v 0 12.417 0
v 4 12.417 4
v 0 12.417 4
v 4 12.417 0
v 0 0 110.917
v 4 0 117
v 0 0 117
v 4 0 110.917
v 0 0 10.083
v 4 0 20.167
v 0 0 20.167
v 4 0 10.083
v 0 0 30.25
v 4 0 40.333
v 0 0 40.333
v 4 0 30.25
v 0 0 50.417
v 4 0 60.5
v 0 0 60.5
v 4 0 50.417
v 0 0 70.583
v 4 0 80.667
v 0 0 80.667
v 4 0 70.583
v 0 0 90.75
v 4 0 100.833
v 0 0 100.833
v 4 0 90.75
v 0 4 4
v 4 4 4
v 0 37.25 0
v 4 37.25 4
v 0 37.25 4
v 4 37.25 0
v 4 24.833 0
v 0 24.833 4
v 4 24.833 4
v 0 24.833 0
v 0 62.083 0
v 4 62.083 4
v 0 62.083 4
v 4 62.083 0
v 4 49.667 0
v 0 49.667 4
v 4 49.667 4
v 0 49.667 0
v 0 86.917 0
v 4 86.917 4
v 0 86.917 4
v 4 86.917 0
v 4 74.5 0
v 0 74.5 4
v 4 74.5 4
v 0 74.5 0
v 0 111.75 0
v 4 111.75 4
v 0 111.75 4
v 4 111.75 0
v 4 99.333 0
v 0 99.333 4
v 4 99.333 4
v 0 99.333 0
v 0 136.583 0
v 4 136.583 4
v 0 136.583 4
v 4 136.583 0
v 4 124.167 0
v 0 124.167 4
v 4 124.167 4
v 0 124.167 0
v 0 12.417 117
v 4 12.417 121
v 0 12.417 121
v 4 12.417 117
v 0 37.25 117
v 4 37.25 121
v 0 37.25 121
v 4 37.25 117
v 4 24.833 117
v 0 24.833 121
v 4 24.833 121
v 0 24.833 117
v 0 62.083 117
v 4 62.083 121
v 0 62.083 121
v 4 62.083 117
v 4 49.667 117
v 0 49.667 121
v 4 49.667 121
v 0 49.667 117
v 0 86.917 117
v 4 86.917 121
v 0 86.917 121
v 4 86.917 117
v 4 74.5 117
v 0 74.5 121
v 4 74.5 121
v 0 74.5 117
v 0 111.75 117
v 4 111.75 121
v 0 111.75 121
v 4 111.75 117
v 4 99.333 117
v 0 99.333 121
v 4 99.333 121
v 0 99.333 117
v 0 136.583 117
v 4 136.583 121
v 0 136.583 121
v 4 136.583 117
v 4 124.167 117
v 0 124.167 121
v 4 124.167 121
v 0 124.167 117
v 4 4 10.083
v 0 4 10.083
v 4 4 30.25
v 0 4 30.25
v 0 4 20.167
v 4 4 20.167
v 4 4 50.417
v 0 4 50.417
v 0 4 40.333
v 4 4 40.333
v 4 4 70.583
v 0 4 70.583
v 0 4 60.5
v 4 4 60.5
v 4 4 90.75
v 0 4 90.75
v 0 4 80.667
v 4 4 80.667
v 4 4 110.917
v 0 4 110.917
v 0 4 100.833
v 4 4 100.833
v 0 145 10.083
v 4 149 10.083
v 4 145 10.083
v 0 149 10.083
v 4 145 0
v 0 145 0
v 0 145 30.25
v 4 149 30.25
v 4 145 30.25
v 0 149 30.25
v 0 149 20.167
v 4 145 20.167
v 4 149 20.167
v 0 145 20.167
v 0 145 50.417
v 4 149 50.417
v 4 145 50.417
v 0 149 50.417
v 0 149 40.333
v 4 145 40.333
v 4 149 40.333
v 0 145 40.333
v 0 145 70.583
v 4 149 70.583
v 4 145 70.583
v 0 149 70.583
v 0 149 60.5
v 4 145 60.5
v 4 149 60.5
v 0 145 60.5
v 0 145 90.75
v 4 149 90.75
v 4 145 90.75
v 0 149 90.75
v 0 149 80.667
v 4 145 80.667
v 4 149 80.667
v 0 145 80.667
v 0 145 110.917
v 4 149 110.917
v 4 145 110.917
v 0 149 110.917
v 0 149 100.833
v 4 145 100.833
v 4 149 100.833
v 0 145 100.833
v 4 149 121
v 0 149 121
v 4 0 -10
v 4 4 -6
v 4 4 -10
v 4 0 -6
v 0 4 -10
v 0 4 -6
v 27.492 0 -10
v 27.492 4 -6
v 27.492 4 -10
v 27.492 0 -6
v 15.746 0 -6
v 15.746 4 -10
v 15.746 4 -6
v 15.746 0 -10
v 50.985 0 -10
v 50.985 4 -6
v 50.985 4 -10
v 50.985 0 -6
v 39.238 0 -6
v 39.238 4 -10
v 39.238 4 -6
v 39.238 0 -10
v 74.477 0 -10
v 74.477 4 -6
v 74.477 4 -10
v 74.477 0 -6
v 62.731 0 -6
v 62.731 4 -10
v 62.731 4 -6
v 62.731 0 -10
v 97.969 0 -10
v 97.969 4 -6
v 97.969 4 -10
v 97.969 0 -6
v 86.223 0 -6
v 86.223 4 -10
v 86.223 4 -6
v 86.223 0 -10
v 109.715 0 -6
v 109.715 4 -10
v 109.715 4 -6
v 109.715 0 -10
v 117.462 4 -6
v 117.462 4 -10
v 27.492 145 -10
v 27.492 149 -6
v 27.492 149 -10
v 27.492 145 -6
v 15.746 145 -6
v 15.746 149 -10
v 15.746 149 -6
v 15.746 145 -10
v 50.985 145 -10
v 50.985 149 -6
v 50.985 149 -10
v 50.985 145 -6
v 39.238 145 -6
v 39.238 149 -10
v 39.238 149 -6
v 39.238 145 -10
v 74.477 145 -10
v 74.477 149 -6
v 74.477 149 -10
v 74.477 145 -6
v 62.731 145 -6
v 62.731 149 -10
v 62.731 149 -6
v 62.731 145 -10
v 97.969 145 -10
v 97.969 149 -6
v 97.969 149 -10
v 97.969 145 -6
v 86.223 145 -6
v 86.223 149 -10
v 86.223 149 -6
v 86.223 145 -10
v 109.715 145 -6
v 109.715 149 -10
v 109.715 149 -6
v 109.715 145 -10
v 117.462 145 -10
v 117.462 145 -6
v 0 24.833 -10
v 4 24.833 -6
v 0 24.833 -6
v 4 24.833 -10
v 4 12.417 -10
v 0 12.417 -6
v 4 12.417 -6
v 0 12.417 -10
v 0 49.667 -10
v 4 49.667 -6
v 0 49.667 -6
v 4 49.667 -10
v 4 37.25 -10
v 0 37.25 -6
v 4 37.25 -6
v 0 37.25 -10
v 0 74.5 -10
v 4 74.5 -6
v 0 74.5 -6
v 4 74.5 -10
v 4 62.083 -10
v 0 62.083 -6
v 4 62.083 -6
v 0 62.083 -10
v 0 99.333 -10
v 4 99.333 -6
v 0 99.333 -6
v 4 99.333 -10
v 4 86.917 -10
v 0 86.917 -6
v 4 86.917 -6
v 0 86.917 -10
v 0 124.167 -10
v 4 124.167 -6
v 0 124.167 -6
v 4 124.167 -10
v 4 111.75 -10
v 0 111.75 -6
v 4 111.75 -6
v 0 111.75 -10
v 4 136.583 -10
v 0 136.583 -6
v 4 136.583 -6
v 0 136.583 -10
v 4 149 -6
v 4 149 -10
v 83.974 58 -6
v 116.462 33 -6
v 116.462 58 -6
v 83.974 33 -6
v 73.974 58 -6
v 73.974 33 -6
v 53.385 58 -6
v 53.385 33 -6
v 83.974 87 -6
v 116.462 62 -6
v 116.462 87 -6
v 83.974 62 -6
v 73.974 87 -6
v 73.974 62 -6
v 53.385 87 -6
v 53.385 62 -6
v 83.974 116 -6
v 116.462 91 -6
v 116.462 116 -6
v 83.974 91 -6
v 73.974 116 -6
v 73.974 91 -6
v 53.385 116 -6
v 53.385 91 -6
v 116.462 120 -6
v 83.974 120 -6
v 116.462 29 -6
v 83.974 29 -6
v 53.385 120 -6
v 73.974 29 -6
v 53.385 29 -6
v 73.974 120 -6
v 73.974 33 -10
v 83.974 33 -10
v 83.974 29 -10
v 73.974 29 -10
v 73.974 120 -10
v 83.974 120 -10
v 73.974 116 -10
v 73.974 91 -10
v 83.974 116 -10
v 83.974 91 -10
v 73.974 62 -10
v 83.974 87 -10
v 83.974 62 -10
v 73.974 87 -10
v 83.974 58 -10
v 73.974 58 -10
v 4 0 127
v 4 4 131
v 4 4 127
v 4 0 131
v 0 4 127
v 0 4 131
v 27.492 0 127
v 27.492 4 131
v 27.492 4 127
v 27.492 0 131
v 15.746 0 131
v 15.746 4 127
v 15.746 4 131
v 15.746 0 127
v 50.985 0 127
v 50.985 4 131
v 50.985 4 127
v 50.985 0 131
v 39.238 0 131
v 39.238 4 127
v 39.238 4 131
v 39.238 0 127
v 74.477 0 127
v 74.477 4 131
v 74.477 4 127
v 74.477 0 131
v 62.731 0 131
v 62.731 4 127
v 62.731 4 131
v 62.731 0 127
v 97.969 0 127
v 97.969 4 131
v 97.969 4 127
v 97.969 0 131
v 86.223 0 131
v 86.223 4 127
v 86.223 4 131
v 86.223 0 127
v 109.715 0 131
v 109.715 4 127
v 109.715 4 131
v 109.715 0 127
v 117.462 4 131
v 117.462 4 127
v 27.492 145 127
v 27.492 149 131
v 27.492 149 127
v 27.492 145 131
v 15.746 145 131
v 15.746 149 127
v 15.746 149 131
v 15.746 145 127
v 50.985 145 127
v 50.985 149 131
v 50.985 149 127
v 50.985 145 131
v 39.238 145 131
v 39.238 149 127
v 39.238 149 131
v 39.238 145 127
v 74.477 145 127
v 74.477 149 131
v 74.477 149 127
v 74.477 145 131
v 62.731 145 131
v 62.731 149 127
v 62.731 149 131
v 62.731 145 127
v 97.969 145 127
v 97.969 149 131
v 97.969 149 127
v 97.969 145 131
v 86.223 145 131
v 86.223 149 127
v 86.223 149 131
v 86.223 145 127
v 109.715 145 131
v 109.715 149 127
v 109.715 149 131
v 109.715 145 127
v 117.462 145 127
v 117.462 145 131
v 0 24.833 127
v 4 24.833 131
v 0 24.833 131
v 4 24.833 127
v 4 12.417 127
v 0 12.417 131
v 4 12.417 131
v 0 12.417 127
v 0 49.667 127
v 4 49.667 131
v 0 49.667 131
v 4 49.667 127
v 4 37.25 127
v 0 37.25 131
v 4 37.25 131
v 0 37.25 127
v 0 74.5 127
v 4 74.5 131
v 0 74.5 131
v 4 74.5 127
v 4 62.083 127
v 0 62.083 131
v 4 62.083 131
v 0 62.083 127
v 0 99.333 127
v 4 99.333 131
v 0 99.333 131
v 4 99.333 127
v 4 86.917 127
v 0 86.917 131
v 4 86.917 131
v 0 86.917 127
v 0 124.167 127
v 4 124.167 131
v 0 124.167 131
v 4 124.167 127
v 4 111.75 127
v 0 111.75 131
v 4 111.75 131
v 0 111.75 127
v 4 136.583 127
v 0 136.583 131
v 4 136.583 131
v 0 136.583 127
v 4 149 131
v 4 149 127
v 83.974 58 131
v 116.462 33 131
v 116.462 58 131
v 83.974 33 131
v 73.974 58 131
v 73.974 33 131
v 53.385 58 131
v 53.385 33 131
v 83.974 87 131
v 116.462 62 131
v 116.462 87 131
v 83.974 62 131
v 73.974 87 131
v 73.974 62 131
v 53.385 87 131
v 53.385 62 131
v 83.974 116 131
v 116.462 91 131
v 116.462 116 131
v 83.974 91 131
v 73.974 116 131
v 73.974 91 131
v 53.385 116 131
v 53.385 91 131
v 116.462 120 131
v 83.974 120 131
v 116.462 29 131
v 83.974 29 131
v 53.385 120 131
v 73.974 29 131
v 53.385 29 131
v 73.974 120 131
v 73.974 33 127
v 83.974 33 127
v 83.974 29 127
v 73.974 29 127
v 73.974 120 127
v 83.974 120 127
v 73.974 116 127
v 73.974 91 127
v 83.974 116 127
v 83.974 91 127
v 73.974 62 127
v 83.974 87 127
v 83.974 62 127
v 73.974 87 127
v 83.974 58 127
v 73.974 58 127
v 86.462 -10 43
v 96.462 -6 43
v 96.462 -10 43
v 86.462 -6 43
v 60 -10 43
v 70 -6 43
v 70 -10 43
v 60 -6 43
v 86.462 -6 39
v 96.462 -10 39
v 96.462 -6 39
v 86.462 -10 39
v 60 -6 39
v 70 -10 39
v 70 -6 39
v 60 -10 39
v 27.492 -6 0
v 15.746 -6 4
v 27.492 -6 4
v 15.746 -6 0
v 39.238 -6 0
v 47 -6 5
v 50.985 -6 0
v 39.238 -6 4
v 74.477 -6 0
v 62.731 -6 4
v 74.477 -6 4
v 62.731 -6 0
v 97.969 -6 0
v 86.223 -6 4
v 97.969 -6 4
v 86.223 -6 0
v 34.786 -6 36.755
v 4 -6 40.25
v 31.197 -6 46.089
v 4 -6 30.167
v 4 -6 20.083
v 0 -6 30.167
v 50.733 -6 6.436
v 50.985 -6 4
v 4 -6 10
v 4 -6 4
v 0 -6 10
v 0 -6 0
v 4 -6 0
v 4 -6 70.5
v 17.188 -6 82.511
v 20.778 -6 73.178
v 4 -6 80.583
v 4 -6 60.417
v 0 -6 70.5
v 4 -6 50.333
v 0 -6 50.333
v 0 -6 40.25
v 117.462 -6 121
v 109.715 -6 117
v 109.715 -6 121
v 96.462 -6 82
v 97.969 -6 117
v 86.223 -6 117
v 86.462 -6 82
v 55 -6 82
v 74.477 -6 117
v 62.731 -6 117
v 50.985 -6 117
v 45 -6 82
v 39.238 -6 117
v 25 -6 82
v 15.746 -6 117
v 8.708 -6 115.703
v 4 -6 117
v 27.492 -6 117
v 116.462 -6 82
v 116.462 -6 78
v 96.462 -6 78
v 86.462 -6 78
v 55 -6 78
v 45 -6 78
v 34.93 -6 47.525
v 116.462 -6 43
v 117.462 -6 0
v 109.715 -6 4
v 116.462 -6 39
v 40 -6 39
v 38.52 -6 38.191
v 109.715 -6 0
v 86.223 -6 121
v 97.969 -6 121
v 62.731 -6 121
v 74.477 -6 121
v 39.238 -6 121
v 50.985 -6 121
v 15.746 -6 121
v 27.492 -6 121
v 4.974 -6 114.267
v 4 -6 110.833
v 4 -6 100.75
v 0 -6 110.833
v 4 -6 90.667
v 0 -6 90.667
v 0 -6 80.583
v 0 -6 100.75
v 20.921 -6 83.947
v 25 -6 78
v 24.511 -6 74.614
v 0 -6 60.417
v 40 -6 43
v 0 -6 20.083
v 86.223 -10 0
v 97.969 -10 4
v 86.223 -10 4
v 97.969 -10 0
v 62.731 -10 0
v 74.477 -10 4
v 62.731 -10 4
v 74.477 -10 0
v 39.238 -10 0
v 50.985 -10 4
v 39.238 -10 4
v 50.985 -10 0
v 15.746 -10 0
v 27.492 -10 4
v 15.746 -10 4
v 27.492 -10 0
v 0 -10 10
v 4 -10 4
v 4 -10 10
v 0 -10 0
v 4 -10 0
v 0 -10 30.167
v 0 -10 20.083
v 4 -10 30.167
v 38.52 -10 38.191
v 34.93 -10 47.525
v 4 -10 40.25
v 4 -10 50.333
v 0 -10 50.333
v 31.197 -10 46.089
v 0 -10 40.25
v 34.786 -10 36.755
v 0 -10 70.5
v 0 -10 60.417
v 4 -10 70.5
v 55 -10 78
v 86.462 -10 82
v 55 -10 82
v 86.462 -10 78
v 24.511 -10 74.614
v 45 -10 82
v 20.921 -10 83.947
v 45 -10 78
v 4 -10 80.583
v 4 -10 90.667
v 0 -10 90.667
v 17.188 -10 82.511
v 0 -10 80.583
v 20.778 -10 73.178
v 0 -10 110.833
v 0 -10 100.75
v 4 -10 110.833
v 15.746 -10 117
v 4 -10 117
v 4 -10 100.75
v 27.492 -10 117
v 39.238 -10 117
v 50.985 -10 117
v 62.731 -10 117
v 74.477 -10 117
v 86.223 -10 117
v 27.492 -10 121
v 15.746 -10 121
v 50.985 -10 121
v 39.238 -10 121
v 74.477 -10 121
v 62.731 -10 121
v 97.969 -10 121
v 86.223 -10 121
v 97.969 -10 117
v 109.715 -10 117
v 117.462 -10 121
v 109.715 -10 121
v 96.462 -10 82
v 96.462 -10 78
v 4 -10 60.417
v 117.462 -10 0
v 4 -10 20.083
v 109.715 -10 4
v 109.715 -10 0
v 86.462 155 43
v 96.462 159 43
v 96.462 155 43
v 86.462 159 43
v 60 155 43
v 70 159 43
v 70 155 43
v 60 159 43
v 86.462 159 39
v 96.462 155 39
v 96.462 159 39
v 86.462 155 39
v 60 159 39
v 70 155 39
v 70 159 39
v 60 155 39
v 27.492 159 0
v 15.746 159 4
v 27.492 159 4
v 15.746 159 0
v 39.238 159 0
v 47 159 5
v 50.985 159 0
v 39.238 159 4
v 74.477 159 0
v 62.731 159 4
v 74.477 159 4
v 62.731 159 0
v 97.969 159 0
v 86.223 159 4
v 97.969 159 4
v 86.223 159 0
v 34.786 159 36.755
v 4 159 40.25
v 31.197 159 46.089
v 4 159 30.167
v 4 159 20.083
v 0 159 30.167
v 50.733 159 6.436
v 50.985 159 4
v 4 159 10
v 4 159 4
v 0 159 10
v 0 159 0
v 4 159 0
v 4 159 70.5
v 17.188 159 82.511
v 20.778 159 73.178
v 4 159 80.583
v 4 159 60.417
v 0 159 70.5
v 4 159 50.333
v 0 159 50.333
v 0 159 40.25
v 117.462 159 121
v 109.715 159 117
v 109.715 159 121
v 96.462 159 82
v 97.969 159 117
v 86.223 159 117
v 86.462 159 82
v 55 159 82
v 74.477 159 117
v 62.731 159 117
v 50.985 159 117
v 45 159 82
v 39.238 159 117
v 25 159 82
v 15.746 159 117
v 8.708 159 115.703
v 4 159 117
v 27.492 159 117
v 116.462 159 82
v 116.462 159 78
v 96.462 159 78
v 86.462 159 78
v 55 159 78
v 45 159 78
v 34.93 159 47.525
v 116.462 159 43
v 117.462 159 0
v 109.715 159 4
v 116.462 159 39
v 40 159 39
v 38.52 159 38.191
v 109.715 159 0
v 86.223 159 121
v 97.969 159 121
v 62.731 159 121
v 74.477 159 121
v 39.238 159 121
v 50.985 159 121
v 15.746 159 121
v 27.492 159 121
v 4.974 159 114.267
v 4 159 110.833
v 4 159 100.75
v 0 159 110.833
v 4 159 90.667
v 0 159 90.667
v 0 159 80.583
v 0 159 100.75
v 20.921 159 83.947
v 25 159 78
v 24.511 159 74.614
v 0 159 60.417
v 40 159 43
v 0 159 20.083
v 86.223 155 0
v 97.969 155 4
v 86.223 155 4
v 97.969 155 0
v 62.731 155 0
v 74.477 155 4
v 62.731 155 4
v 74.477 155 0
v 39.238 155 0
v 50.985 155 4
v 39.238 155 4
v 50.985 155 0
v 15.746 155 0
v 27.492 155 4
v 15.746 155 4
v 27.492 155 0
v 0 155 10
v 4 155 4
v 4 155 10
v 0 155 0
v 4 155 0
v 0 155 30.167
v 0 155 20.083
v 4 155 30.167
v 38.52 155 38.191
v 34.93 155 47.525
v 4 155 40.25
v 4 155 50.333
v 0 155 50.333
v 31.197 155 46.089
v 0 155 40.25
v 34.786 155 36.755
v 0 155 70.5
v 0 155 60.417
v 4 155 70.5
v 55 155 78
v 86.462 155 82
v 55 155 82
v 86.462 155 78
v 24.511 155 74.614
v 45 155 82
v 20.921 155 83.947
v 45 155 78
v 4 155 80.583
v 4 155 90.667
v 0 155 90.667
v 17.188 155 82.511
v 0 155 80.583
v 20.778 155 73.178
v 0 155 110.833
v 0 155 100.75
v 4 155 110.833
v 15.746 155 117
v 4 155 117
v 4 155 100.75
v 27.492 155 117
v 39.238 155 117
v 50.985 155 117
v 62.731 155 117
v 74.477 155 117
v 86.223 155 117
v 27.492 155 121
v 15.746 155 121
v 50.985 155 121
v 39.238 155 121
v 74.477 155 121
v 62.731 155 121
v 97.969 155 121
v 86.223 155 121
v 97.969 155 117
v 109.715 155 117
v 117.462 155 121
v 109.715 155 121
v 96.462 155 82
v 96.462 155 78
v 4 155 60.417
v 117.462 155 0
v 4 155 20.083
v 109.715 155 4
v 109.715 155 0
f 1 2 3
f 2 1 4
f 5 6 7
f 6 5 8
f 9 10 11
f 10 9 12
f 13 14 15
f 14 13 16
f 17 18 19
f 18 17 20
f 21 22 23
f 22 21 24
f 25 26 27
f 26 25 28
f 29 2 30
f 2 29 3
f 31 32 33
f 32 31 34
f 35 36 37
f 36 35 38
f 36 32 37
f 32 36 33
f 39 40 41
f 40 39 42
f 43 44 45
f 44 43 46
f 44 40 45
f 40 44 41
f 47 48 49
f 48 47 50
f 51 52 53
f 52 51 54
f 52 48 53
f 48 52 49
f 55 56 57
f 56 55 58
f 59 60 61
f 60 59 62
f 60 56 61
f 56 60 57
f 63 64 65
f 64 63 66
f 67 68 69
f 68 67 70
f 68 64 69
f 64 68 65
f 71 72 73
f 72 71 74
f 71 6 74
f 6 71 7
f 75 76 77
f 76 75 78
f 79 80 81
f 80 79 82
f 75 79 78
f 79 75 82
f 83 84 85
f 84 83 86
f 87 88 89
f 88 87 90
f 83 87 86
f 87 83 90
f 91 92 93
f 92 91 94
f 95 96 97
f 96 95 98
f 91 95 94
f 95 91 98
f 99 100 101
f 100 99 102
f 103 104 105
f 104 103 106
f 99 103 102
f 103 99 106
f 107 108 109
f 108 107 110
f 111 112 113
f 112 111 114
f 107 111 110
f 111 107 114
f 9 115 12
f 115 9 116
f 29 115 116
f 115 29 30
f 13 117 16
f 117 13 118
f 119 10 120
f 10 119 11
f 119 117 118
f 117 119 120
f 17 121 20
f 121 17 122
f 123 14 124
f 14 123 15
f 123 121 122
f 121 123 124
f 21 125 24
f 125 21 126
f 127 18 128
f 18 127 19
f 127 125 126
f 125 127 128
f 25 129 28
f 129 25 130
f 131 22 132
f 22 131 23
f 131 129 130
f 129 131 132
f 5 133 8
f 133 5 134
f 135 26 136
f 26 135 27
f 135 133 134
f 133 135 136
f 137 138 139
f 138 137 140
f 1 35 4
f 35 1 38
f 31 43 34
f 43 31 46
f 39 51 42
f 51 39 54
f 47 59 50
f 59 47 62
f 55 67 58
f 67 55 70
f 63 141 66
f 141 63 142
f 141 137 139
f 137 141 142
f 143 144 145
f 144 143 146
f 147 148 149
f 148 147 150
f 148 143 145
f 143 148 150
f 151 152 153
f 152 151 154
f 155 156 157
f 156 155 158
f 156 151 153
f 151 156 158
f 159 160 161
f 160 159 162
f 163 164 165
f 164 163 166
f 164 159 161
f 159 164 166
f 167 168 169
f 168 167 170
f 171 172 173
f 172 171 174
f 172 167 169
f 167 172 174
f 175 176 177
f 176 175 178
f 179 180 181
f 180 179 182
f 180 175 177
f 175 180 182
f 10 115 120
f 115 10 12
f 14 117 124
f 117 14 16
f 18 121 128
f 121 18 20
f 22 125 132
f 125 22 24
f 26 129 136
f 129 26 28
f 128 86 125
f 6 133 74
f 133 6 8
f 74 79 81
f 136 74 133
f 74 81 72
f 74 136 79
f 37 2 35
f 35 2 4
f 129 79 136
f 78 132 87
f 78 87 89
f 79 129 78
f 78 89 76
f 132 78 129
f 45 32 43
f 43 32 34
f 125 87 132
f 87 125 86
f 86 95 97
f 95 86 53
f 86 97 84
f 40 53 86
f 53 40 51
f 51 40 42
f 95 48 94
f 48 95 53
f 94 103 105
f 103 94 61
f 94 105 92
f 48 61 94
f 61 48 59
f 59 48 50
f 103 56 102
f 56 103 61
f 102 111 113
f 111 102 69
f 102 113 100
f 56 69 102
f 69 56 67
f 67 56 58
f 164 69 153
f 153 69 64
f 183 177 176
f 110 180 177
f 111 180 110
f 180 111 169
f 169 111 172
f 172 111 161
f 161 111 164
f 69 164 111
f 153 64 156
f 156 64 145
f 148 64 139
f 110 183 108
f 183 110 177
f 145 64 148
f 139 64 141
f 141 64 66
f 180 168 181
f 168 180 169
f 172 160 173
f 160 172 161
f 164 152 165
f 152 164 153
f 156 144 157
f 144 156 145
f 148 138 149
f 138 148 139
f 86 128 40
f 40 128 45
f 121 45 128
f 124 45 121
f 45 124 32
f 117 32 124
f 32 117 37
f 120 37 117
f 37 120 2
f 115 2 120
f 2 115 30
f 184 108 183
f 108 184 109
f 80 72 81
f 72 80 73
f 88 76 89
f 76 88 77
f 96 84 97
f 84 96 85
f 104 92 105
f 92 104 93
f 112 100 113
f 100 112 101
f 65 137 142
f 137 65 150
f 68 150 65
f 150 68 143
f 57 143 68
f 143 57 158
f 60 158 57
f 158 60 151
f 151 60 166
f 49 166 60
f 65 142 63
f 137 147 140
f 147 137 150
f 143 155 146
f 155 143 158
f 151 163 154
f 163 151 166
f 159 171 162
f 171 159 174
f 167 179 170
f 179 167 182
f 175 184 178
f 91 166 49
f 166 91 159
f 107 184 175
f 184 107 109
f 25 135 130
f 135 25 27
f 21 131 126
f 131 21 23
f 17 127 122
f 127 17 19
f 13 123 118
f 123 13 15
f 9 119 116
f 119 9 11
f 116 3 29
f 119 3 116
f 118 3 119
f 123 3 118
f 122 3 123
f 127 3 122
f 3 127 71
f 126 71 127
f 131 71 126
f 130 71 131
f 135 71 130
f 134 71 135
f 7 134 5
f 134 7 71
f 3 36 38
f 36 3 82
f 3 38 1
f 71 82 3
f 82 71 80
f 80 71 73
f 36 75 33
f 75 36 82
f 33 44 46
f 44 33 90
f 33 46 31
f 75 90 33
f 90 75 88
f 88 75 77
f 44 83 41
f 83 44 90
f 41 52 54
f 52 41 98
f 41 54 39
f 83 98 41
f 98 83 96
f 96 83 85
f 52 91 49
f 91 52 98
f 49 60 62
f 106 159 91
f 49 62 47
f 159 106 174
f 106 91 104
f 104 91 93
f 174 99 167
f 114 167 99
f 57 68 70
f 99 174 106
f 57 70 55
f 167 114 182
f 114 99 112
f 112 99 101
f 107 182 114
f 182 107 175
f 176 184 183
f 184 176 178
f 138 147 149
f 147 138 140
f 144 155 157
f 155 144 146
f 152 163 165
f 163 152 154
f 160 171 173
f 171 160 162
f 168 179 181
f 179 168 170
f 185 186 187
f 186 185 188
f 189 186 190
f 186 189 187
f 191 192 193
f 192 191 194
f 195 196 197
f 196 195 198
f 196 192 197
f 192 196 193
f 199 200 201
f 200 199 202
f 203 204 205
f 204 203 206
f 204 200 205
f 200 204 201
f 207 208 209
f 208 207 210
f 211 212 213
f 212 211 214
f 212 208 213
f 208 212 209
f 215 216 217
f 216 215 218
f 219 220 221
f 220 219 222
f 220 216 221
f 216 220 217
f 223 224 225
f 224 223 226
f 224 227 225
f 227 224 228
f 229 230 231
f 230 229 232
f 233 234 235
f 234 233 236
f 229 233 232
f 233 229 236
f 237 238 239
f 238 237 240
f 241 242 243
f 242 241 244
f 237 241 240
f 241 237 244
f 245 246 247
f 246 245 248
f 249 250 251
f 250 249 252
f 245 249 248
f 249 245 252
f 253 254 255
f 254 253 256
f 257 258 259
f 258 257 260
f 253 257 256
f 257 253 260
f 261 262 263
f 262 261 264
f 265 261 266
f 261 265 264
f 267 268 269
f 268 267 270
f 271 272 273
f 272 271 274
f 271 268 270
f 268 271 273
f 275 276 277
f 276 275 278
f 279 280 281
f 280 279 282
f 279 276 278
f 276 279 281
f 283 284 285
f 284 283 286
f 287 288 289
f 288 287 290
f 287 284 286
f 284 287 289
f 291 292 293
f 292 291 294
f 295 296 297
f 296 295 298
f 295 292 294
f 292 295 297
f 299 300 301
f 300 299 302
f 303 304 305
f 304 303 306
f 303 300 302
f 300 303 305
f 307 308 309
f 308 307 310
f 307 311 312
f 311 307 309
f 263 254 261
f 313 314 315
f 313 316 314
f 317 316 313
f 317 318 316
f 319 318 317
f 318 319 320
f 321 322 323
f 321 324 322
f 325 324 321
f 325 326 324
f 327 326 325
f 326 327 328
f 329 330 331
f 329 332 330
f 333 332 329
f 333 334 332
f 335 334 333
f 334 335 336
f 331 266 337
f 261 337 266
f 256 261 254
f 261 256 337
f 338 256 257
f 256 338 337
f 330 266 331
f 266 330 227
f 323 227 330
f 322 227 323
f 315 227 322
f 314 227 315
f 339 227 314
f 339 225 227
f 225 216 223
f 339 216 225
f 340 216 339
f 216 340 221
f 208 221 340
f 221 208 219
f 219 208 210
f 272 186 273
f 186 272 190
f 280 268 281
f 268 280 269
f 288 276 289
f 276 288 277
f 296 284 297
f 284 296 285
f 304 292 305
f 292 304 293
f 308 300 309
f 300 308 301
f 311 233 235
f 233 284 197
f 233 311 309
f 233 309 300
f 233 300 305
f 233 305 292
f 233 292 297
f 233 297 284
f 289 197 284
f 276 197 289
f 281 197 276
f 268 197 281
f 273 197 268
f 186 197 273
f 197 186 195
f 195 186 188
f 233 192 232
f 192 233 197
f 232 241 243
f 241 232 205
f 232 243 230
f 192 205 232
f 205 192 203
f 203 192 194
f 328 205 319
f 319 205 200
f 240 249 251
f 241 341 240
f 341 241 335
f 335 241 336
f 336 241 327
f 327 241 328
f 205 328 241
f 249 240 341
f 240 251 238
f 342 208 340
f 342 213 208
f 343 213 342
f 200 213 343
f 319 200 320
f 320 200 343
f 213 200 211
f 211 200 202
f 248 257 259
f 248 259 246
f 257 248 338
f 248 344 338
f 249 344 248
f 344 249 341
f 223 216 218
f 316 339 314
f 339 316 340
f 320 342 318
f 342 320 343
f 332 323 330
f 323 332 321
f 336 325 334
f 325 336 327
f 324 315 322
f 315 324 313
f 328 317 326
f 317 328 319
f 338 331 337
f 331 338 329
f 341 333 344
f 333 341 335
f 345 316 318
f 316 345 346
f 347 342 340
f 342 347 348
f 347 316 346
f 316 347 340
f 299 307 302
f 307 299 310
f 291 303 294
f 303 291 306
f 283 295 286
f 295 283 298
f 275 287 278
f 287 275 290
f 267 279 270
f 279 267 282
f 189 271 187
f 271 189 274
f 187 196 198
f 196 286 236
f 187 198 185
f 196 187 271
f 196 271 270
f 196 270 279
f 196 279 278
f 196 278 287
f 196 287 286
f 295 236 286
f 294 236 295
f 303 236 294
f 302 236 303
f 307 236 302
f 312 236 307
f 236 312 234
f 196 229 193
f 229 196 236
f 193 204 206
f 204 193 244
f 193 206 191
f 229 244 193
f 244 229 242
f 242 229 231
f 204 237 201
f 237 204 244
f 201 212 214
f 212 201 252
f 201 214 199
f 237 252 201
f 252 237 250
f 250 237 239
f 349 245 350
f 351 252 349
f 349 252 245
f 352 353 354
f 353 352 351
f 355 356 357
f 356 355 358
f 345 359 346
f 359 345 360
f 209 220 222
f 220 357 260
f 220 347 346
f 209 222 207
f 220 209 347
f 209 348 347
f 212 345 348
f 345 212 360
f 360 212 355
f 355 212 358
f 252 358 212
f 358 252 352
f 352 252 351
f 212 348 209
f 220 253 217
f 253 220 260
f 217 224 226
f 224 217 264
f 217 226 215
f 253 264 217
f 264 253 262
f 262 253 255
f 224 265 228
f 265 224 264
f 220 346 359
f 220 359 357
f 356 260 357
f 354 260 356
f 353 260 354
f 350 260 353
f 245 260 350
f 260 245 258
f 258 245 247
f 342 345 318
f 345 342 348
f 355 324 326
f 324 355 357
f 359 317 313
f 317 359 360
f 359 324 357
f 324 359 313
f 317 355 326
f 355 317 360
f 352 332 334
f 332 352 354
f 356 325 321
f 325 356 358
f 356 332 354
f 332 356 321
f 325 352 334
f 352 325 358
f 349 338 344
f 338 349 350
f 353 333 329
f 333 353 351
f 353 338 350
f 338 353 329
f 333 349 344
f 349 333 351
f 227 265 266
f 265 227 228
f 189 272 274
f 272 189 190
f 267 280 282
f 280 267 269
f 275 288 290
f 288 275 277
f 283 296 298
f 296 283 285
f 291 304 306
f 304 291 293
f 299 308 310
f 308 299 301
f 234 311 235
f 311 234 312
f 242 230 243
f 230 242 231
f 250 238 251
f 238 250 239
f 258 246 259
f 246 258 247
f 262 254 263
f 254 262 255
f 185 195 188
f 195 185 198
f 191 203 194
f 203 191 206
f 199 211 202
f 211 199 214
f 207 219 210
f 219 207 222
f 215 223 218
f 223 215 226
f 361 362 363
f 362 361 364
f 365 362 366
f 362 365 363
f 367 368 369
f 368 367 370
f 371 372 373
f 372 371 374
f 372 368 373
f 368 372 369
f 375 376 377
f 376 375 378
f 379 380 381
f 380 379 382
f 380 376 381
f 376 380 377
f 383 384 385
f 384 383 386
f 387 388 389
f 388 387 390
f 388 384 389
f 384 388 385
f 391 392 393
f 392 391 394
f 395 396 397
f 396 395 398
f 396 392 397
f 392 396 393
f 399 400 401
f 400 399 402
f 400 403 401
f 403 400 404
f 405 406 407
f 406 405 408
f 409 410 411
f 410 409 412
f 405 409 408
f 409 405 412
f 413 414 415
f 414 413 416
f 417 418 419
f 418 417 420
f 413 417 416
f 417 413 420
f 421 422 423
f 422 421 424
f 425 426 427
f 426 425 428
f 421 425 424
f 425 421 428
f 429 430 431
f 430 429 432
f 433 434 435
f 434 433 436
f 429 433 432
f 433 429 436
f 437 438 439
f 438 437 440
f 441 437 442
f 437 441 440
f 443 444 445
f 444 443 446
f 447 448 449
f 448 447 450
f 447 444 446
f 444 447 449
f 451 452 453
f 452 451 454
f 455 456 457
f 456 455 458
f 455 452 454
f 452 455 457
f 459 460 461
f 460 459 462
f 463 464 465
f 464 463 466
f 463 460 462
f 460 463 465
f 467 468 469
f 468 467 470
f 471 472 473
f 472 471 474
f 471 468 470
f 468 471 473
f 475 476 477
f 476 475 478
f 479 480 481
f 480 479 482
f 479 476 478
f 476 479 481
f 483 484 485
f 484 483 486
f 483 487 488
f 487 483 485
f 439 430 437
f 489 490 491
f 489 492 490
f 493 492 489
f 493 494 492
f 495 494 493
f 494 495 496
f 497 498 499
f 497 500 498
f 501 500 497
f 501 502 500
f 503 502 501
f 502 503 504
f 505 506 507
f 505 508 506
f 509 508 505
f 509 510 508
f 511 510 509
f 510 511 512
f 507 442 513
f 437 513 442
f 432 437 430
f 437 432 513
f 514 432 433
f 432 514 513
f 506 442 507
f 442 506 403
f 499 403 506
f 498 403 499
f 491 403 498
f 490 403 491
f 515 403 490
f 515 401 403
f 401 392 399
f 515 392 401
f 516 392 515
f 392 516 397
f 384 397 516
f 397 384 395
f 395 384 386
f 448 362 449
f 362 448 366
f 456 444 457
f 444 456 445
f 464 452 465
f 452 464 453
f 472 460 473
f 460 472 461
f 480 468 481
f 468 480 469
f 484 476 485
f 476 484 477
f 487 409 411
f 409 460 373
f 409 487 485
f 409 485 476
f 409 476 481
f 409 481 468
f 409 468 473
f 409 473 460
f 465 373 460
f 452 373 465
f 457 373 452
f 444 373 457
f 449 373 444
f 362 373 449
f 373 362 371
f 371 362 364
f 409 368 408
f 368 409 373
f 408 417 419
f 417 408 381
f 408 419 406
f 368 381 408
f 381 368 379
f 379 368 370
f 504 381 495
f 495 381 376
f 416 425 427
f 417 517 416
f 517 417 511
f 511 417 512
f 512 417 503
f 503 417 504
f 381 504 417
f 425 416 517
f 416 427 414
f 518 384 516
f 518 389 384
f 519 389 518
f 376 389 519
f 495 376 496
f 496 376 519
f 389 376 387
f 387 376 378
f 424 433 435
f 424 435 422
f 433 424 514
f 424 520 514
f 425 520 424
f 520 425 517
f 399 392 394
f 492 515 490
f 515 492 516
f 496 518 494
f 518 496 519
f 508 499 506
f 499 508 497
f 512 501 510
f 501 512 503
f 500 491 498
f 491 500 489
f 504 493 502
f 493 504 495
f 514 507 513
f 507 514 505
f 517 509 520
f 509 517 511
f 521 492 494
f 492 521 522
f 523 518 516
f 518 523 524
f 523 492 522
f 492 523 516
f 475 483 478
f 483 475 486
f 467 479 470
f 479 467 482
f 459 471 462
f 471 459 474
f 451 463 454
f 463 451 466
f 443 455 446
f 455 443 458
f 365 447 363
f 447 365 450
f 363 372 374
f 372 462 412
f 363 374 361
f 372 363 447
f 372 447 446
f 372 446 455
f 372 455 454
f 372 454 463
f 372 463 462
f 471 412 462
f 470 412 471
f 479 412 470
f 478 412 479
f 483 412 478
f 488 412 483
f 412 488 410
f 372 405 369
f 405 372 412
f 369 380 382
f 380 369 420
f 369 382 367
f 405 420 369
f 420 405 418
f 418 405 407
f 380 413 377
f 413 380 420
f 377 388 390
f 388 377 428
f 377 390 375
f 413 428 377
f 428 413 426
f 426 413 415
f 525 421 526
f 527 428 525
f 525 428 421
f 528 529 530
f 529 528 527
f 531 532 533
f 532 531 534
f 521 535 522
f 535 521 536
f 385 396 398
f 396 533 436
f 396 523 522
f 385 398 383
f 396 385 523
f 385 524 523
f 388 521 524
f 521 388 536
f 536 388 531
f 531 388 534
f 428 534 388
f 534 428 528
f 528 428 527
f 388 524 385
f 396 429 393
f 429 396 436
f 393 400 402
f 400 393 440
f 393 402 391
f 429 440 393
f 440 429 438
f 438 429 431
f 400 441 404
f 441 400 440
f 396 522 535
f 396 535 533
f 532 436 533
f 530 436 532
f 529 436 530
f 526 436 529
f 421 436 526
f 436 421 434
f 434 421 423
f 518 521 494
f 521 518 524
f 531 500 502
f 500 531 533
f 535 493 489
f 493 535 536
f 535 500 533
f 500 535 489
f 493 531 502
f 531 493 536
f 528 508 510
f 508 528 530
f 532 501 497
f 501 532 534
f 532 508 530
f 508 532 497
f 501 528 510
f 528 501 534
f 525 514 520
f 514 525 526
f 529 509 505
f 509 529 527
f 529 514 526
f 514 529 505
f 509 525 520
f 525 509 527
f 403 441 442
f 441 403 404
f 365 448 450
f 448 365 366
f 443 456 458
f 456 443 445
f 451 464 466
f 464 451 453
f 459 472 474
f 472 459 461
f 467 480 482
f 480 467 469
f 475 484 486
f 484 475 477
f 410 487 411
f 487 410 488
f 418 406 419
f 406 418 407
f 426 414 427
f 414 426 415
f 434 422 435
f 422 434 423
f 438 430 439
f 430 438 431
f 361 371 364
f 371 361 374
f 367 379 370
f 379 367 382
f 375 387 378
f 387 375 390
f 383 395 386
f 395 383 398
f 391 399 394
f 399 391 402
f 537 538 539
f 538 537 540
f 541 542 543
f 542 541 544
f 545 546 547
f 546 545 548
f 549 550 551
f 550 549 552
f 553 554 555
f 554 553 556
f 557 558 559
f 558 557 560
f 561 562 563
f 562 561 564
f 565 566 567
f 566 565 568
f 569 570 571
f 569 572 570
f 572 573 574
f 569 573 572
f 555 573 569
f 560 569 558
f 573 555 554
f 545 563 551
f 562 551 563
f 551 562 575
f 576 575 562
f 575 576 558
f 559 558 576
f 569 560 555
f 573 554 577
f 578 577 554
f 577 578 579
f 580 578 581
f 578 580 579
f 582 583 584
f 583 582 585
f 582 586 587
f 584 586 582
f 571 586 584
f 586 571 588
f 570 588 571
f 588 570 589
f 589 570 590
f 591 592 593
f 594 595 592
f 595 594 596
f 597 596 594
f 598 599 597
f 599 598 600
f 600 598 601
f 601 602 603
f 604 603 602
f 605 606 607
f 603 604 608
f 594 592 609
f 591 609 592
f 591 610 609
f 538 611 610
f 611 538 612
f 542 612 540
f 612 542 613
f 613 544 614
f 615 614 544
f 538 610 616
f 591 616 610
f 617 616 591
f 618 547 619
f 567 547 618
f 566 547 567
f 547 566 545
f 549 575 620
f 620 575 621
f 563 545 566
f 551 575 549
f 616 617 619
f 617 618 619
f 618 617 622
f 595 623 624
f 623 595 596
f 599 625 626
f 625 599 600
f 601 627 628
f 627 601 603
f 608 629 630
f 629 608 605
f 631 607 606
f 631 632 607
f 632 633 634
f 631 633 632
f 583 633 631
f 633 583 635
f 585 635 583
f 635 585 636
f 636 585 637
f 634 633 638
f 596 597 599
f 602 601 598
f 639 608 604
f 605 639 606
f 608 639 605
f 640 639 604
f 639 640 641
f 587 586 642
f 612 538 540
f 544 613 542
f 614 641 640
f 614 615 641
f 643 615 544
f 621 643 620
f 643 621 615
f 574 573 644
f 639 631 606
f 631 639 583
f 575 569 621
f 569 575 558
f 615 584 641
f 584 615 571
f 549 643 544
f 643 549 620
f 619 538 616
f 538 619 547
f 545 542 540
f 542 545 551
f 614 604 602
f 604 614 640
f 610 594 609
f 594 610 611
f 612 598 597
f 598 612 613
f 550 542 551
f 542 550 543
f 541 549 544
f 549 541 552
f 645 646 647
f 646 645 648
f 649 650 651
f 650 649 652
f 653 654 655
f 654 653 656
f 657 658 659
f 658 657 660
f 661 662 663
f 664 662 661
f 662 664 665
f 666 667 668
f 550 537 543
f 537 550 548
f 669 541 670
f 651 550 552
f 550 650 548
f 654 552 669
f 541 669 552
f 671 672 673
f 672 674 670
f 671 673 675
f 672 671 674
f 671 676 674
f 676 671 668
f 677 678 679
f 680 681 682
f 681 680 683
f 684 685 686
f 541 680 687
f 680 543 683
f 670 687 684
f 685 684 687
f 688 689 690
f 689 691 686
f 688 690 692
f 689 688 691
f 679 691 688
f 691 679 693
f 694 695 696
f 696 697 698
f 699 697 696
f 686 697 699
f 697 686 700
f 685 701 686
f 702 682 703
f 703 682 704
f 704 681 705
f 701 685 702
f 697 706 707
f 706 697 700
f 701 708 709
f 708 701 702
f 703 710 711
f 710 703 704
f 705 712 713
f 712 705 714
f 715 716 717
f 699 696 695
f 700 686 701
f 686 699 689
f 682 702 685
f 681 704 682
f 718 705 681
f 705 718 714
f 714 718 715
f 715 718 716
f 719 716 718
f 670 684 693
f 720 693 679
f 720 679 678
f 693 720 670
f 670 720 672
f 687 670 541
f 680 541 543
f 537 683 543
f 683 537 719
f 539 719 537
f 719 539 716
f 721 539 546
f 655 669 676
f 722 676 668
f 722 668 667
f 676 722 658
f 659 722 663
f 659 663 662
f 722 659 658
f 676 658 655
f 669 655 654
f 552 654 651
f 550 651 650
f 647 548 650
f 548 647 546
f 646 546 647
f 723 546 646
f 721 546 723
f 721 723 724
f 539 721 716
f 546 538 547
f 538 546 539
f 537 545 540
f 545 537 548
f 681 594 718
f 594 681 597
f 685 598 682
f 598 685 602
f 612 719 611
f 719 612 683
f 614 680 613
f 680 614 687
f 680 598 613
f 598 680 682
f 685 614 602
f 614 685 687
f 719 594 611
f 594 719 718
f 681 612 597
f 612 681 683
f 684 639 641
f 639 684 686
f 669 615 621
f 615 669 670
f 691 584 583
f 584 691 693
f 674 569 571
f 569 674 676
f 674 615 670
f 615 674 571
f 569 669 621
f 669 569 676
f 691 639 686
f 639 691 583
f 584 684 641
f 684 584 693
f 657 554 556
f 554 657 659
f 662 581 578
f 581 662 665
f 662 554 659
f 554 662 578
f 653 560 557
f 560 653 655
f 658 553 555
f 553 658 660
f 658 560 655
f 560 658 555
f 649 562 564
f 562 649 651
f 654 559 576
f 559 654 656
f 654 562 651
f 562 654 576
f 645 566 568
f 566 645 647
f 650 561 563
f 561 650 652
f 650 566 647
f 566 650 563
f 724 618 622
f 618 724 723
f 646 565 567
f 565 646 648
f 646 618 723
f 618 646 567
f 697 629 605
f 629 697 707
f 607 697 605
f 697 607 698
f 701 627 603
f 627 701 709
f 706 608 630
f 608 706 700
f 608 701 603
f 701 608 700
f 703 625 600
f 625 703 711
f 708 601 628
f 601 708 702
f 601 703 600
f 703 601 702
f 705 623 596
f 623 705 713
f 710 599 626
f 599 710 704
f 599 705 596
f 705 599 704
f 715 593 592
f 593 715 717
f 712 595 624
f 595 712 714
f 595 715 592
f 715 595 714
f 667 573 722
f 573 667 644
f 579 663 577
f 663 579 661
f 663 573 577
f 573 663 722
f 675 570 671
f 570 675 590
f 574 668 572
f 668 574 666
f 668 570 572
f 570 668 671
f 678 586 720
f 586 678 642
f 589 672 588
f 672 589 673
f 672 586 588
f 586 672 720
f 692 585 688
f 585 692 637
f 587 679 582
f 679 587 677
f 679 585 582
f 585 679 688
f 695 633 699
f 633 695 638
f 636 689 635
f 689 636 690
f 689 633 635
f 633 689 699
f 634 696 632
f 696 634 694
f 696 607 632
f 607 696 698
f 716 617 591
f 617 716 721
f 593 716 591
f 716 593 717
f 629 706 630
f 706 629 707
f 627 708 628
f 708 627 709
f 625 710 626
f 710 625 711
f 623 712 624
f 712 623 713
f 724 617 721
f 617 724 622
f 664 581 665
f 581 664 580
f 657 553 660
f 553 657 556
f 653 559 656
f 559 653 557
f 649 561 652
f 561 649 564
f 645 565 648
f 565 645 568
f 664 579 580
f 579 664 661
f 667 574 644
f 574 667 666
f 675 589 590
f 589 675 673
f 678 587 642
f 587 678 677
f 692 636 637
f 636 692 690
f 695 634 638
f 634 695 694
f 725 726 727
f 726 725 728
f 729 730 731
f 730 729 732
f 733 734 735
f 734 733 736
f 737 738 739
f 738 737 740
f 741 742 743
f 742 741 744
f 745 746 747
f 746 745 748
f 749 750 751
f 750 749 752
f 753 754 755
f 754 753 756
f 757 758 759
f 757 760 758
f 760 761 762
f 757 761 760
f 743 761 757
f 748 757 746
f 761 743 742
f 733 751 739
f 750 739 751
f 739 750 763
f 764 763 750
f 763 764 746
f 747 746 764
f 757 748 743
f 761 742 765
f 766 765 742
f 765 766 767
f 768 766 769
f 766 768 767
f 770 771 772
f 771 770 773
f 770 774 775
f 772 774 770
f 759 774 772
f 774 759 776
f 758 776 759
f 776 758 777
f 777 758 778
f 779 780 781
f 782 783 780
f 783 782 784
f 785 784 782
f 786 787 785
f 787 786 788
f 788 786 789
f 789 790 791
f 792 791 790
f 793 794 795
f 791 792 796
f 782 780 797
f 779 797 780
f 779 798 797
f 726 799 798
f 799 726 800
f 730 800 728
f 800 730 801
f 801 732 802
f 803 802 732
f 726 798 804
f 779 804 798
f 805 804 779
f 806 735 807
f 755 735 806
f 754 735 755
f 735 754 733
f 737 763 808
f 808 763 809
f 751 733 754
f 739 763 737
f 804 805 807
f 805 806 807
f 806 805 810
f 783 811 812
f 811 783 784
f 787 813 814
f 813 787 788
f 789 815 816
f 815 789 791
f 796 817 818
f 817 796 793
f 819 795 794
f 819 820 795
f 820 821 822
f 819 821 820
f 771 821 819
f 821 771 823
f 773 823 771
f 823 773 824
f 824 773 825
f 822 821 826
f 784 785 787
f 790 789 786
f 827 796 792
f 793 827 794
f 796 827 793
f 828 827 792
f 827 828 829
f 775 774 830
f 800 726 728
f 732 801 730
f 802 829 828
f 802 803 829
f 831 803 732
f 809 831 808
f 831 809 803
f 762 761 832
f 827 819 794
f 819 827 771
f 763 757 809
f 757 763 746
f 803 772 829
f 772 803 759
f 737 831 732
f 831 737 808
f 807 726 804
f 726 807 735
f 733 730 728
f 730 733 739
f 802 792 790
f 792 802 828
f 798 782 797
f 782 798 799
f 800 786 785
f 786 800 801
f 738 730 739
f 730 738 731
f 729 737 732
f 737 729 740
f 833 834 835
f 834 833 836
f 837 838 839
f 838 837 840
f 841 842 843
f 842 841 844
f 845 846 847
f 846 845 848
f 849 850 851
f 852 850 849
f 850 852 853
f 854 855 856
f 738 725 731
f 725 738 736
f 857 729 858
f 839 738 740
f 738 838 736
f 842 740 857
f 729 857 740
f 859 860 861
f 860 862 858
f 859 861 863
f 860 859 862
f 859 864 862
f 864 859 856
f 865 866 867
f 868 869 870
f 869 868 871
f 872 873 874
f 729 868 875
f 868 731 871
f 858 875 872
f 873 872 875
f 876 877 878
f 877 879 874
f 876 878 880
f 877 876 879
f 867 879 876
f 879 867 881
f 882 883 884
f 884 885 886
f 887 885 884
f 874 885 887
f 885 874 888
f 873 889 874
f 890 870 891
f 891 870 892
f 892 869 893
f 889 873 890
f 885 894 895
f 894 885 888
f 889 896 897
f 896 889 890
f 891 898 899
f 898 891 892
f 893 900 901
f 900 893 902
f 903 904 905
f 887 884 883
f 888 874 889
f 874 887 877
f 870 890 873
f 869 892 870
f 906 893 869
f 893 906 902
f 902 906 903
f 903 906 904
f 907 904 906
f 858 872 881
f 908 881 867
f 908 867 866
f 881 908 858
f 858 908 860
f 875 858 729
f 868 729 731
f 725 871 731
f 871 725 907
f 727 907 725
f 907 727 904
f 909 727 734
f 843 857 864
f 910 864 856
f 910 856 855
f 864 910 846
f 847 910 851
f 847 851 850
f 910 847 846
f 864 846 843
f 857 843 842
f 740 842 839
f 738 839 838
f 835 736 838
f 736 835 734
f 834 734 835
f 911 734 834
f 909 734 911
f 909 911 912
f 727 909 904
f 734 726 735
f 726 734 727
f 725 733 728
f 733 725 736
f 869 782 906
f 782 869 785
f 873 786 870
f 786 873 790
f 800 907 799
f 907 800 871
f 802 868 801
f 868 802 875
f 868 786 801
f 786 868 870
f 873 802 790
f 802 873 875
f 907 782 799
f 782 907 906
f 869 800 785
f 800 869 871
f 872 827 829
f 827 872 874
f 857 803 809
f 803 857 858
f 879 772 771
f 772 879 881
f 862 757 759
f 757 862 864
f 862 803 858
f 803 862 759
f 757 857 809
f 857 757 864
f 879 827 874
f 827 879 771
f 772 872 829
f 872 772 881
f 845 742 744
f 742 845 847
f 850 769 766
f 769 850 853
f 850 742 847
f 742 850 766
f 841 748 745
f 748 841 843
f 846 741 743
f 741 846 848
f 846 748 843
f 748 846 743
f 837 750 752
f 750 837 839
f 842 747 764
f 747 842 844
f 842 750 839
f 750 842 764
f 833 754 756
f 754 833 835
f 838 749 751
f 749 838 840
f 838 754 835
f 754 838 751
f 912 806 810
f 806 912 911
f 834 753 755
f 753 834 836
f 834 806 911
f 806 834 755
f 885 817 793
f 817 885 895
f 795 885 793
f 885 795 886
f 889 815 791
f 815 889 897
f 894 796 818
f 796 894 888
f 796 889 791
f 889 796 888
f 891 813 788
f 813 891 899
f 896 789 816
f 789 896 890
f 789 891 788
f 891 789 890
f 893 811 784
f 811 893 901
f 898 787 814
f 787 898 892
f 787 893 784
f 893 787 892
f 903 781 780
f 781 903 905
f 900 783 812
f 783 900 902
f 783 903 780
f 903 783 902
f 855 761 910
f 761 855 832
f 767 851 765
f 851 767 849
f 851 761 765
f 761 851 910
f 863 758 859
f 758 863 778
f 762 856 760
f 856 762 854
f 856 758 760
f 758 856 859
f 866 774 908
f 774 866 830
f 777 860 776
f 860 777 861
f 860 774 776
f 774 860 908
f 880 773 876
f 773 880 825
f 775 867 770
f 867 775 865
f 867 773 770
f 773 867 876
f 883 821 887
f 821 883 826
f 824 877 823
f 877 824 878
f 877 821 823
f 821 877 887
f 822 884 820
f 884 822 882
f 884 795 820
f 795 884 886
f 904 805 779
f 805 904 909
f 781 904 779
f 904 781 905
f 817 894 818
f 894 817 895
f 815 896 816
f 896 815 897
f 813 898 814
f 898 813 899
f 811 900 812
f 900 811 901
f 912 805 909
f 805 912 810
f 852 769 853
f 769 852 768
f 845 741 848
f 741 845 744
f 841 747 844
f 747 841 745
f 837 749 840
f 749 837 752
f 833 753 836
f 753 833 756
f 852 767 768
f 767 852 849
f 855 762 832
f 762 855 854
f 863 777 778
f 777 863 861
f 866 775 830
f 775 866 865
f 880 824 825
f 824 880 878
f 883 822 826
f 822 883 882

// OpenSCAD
// file: harmonica-body.scad
harmonicaHeight = 30;
harmonicaLength = 105;
harmonicaThickness = 20;

module harmonicaBody() {
    cube([harmonicaLength, harmonicaThickness, harmonicaHeight]);
}

rotate([0,90,0])
  translate([-harmonicaLength,0,0])
  harmonicaBody();
// file: utils/crenel.scad
include <../dimensions.scad>

margin = 2;

module crenel(repetitions, size = 10) {
  for(i=[1:repetitions]) {
    translate([2 * size * (i -1), -margin, -margin])
    cube([size, $materialThickness + margin, $materialThickness + 2 * margin]);
  }
}

module hole_crenel(repetitions, size = 10) {
  for(i=[1:repetitions]) {
    translate([2 * size * (i -1), 0, -margin])
      cube([size, $materialThickness, $materialThickness + 2 * margin]);
  }
}
// file: box-inset.scad
include <./dimensions.scad>
use <./harmonica-body.scad>

margin = 5;

insideWidth = $horizontalPlacements * $thickGap + ($horizontalPlacements - 1) * $materialThickness;


function offsetCalculator(level) = 
  $materialThickness + ($verticalPlacements - level) *($heightGap + $materialThickness) / tan (90-$slantAngle) + 2;

echo("offset #1-> ", offsetCalculator(0));
echo("offset #2-> ", offsetCalculator(1));
echo("offset #3-> ", offsetCalculator(2));

module insideSlant() {
  // inside-slant offset ->
  slantHeight = ($heightGap + ( $heightGap + $materialThickness) * ($verticalPlacements -1)) / sin(90 - $slantAngle) - $materialThickness;
  union() {
    cube([$materialThickness, insideWidth, slantHeight]);
    translate([0, - $materialThickness, (slantHeight / 3) - 5])
    cube([$materialThickness, insideWidth + 2 * $materialThickness, 10]);
    translate([0, - $materialThickness, 2 * (slantHeight / 3) - 5])
    cube([$materialThickness, insideWidth + 2 * $materialThickness, 10]);
  }
}


module horizontalPlank(height, level = 1) {
  echo("horizontalPlank -> ", level);
  offset = offsetCalculator(level);
  offsetted_height = height - offset;
  translate([offset, 0, 0])
  difference () {
    union() {
      //base
      cube([offsetted_height, insideWidth, $materialThickness]);
      // first set of wings
      translate([20, - $materialThickness, 0])
        cube([10, insideWidth + 2 * $materialThickness, $materialThickness]);
      // second set of wings
      translate([offsetted_height - 30, - $materialThickness, 0])
        cube([10, insideWidth + 2 * $materialThickness, $materialThickness]);
    }
    // notches
    for(i=[0:($horizontalPlacements - 2)]) {
      horizontalShift = (i + 1) * $thickGap + (i *  $materialThickness);
      if (i % 2 == 0){
        translate([offsetted_height / 2, horizontalShift, - margin ])
        cube([offsetted_height / 2 + margin, $materialThickness, 2*margin +  $materialThickness]);
      } else {
        translate([- margin, horizontalShift, - margin])
        cube([offsetted_height / 2 + margin, $materialThickness, 2*margin + $materialThickness]);
      }
    }
  }
}

module verticalSeparator(height, is_even = true) {
  offset = offsetCalculator(1);
  offsetted_height = height - offset;
  separator_witdh = $heightGap + ($verticalPlacements - 1) * ($materialThickness + $heightGap);

  base = 4 + margin;
  bottomOffset = base + (separator_witdh + 2 * margin) / tan(90-$slantAngle);

  // wedge cutout
  wedgePoints = [
    [0, 0, separator_witdh + 2 * margin], // 0
    [base, 0, separator_witdh + 2 * margin], // 1
    [bottomOffset, 0, 0], // 2
    [0, 0, 0], // 3
    [0, $materialThickness + 2 * margin, separator_witdh + 2 * margin], // 4
    [base, $materialThickness + 2 * margin, separator_witdh + 2 * margin], // 5
    [bottomOffset, $materialThickness + 2 * margin, 0], // 6
    [0, $materialThickness + 2 * margin, 0] // 7
  ];
  wedgeFaces = [
    [4, 5, 1, 0], // top
    [0, 1, 2, 3], // front
    [5, 6, 2, 1], // side
    [7, 6, 5, 4], // back
    [6, 7, 3, 2], // bottom
    [7, 4, 0, 3] // other side
  ];

  difference() {
    union() {
      cube([height, $materialThickness, separator_witdh]);
      translate([2 * height / 3 - 5, 0, - $materialThickness])
        cube([10, $materialThickness, separator_witdh + 2 * $materialThickness]);
    }
    translate([-margin, -margin, -margin])
      polyhedron(wedgePoints, wedgeFaces);

    for(i=[1:$verticalPlacements - 1]) {
      offset = offsetCalculator(i);
      offsetted_height = height - offset;
      if (is_even) {
        translate([offset + offsetted_height / 2, -margin, $heightGap + ($heightGap + $materialThickness) * (i-1)])
          cube([offsetted_height / 2 + margin, $materialThickness + 2 * margin, $materialThickness]);
      } else {
        translate([offset - margin, -margin, $heightGap + ($heightGap + $materialThickness) * (i-1)])
          cube([offsetted_height / 2 + margin, $materialThickness + 2 * margin, $materialThickness]);
      }
    }
  }
}

module boxInset(height = $insetLength) {
  for(i=[1:($verticalPlacements - 1)]) {
    translate([0, 0, $heightGap + (i-1) * ($heightGap + $materialThickness)])
      horizontalPlank(height, i);
  }

  translate([offsetCalculator(0) - $materialThickness * 2, 0, 0.25 * $materialThickness])
  rotate([0, -$slantAngle, 0])
    insideSlant();

  for(i=[0:($horizontalPlacements - 2)]) {
    horizontalShift = [0, (i + 1) * $thickGap + i * $materialThickness, 0];
    if(i % 2 == 0) {
      color("blue")
      translate(horizontalShift)
      verticalSeparator(height, true);
    } else {
      color("green")
      translate(horizontalShift)
      verticalSeparator(height, false);
    }
  }
}

boxInset();

if (false) {
  translate([offsetCalculator(0), 0, 0])
    union() {
      color("white")
      harmonicaBody();
      color("magenta")
      cube([$minHarpSeating, 20, 30]);
    }
  color("teal")
  translate([offsetCalculator(1), 0, $materialThickness + $heightGap])
    harmonicaBody();
  translate([offsetCalculator(2), 0, 2*$materialThickness + 2*$heightGap])
    union() {
      color("gray")
      harmonicaBody();
      color("blue")
      cube([$maxHarpSeating, 20, 30]);
    }
}
// file: dimensions.scad
/*
 * This file regroup all the common dimensions, angles, and repetitions
 */

// how many harmonica do you want to store on a given row?
$horizontalPlacements = 5;
$verticalPlacements = 3;

/* hole around the harmonica
 *    ______________
 *   /             /|
 *  /_____________/ | <- height_gap
 *  |             | |
 *  |             | /
 *  |_____________|/ <- thick_gap
 *       ^ length_gap
 */
$thickGap = 25;
//$height_gap = 30; <- this one was a bit tight for Seydels and too tight for the old golden melody
$heightGap = 35; // <- I'll increase that somewhat so I can also install some felt inside the box.
$lengthGap = 105;

// base material thickness, this represent the thickness of the most commonly used material.
$materialThickness = 4;

/* On different rows, harmonica will be seating more or less deelply inside (higher rows deepers than lower ones).
 * You'll probably want to tweak that a bit:
 * - make then seat far enough that the lid doesn't need to be too huge to cover them
 * - not too far so that they are easy to pick up
 * - have a good difference between the different rows so you can see them all nicely
*/
$minHarpSeating = 65;
$maxHarpSeating = 95;

// the difference between the harp seatings dictates how slanted should the inside slant be.
deltaSeating = $maxHarpSeating - $minHarpSeating;
deltaHeight = ($heightGap + $materialThickness) * ($verticalPlacements - 1);
$slantAngle = 90 - atan(deltaHeight / deltaSeating);
echo("slant angle -> ", $slantAngle);


/*
 * inset looks like: 
 *
 * =================================== <- outset border
 * |\
 * | \ <-     maxHarpSeating     ->
 * |  \----------------------------
 * |   \
 * |    \
 * |     \-------------------------      <- vertical separator
 * |      \
 * |       \
 * |        \----------------------
 * | slant ->\
 * |          \<- minHarpSeating ->
 * ===================================
 *                                 \_/ 
 *                                  ^outsetMargin
 *  \_________insetLength_________/
 */

// how far should the inset goes?
insetHeight = $heightGap + ($heightGap + $materialThickness) * ($verticalPlacements - 1);
slantDeltaLength = insetHeight * deltaSeating / deltaHeight;
$insetLength = $minHarpSeating + slantDeltaLength + $materialThickness;
echo("insetLength -> ", $insetLength);
// how much futher should the outset cover?
$outsetMargin = 5;
// main file
/*
 * This file models the outwards part of the case:
 *
 *    ______________________________
 *   / /                         / /|
 *  / /   Width * depth         / / |
 * /_/_________________________/_/  |
 * | |                         | |  |
 * | |                         | |  | <- short side
 * | |                         | |  | (height * depth)
 * | |    Width * height       | |  |
 * | |                         | |  |
 * | |                        <----------- long side
 * | |                         | |  |
 * | |                         | |  /
 * | |                         | | /
 * |_|_________________________|_|/
 *       ^ bottom
 *
 *
 * *short side*: has notches for inside slant's wings and the horizontal plank's short side wings
 * *long side*: has notches for veritcal separators' wings
 * *bottom*: no notches
 */
include <./dimensions.scad>
use <./box-inset.scad>
use <./utils/crenel.scad>

width = $horizontalPlacements * $thickGap + ($horizontalPlacements + 1) * $materialThickness;
depth = $materialThickness + $verticalPlacements * ($materialThickness + $heightGap);

margin = 2;


module bottom() {
  module sideCrenel() {
    translate([2 * margin, 0, 0]) // (depth - 50) / 2 + 10])
    rotate([0,-90, 0])
      crenel(6, depth/12);
  };
  difference() {
    cube([$materialThickness, width, depth]);
    rotate([90, 0, 90])
      crenel(6, width/12);
    translate([0, 0, depth - margin])
    rotate([90, 0, 90])
      crenel(6, width/12);
    sideCrenel();
    translate([0, width - margin, 0])
    sideCrenel();
    translate([-$materialThickness,-$materialThickness,depth - $materialThickness])
      cube(10);
    translate([-$materialThickness,width - $materialThickness,-$materialThickness])
      cube(10);
  }
}

module long_side(height) {
  difference() {
    cube([height, width, $materialThickness]);
    //long-side <-> short side
    translate([- (height/10) + $materialThickness, 0, 0])
      crenel(6, height / 10);
    translate([- (height/10) + $materialThickness, width - margin, 0])
      crenel(6, height / 10);
    // long-side <-> bottom
    translate([margin, width/ 12, 0])
    rotate([0, 0, 90])
      crenel(6, width / 12);
    translate([$materialThickness, $materialThickness, $materialThickness])
      boxInset();
  }
}

module short_side(height) {
  difference() {
    cube([height, $materialThickness, depth]);
    // short-side <-> long-side
    translate([$materialThickness, 0, margin])
    rotate([-90,0, 0])
      crenel(5, height/10);
    translate([$materialThickness, 2 * margin, depth - margin])
    rotate([90,0, 0])
      crenel(5, height/10);
    translate([- $materialThickness, -$materialThickness, depth - $materialThickness])
      cube([10, 20, 30]);

    // short-side <-> bottom
    translate([0, 0, 10 ])
    rotate([-90,-90, 0])
      crenel(6, (depth / 12));
    translate([$materialThickness, $materialThickness, $materialThickness])
      boxInset();
  }
}

module boxOutset(insetLength = $insetLength, outsetMargin = $outsetMargin, extraSpace = 0) {
  height = insetLength + outsetMargin;

  color("red")
  bottom();

  color("green")
  translate([0,0, - extraSpace])
  long_side(height);
  color("blue")
  translate([0,0, depth - $materialThickness + extraSpace])
  long_side(height);

  color("violet")
  translate([0, - extraSpace, 0])
  short_side(height);
  color("yellow")
  translate([0,width - $materialThickness + extraSpace,0])
  short_side(height);
}


boxOutset(extraSpace = 10);
